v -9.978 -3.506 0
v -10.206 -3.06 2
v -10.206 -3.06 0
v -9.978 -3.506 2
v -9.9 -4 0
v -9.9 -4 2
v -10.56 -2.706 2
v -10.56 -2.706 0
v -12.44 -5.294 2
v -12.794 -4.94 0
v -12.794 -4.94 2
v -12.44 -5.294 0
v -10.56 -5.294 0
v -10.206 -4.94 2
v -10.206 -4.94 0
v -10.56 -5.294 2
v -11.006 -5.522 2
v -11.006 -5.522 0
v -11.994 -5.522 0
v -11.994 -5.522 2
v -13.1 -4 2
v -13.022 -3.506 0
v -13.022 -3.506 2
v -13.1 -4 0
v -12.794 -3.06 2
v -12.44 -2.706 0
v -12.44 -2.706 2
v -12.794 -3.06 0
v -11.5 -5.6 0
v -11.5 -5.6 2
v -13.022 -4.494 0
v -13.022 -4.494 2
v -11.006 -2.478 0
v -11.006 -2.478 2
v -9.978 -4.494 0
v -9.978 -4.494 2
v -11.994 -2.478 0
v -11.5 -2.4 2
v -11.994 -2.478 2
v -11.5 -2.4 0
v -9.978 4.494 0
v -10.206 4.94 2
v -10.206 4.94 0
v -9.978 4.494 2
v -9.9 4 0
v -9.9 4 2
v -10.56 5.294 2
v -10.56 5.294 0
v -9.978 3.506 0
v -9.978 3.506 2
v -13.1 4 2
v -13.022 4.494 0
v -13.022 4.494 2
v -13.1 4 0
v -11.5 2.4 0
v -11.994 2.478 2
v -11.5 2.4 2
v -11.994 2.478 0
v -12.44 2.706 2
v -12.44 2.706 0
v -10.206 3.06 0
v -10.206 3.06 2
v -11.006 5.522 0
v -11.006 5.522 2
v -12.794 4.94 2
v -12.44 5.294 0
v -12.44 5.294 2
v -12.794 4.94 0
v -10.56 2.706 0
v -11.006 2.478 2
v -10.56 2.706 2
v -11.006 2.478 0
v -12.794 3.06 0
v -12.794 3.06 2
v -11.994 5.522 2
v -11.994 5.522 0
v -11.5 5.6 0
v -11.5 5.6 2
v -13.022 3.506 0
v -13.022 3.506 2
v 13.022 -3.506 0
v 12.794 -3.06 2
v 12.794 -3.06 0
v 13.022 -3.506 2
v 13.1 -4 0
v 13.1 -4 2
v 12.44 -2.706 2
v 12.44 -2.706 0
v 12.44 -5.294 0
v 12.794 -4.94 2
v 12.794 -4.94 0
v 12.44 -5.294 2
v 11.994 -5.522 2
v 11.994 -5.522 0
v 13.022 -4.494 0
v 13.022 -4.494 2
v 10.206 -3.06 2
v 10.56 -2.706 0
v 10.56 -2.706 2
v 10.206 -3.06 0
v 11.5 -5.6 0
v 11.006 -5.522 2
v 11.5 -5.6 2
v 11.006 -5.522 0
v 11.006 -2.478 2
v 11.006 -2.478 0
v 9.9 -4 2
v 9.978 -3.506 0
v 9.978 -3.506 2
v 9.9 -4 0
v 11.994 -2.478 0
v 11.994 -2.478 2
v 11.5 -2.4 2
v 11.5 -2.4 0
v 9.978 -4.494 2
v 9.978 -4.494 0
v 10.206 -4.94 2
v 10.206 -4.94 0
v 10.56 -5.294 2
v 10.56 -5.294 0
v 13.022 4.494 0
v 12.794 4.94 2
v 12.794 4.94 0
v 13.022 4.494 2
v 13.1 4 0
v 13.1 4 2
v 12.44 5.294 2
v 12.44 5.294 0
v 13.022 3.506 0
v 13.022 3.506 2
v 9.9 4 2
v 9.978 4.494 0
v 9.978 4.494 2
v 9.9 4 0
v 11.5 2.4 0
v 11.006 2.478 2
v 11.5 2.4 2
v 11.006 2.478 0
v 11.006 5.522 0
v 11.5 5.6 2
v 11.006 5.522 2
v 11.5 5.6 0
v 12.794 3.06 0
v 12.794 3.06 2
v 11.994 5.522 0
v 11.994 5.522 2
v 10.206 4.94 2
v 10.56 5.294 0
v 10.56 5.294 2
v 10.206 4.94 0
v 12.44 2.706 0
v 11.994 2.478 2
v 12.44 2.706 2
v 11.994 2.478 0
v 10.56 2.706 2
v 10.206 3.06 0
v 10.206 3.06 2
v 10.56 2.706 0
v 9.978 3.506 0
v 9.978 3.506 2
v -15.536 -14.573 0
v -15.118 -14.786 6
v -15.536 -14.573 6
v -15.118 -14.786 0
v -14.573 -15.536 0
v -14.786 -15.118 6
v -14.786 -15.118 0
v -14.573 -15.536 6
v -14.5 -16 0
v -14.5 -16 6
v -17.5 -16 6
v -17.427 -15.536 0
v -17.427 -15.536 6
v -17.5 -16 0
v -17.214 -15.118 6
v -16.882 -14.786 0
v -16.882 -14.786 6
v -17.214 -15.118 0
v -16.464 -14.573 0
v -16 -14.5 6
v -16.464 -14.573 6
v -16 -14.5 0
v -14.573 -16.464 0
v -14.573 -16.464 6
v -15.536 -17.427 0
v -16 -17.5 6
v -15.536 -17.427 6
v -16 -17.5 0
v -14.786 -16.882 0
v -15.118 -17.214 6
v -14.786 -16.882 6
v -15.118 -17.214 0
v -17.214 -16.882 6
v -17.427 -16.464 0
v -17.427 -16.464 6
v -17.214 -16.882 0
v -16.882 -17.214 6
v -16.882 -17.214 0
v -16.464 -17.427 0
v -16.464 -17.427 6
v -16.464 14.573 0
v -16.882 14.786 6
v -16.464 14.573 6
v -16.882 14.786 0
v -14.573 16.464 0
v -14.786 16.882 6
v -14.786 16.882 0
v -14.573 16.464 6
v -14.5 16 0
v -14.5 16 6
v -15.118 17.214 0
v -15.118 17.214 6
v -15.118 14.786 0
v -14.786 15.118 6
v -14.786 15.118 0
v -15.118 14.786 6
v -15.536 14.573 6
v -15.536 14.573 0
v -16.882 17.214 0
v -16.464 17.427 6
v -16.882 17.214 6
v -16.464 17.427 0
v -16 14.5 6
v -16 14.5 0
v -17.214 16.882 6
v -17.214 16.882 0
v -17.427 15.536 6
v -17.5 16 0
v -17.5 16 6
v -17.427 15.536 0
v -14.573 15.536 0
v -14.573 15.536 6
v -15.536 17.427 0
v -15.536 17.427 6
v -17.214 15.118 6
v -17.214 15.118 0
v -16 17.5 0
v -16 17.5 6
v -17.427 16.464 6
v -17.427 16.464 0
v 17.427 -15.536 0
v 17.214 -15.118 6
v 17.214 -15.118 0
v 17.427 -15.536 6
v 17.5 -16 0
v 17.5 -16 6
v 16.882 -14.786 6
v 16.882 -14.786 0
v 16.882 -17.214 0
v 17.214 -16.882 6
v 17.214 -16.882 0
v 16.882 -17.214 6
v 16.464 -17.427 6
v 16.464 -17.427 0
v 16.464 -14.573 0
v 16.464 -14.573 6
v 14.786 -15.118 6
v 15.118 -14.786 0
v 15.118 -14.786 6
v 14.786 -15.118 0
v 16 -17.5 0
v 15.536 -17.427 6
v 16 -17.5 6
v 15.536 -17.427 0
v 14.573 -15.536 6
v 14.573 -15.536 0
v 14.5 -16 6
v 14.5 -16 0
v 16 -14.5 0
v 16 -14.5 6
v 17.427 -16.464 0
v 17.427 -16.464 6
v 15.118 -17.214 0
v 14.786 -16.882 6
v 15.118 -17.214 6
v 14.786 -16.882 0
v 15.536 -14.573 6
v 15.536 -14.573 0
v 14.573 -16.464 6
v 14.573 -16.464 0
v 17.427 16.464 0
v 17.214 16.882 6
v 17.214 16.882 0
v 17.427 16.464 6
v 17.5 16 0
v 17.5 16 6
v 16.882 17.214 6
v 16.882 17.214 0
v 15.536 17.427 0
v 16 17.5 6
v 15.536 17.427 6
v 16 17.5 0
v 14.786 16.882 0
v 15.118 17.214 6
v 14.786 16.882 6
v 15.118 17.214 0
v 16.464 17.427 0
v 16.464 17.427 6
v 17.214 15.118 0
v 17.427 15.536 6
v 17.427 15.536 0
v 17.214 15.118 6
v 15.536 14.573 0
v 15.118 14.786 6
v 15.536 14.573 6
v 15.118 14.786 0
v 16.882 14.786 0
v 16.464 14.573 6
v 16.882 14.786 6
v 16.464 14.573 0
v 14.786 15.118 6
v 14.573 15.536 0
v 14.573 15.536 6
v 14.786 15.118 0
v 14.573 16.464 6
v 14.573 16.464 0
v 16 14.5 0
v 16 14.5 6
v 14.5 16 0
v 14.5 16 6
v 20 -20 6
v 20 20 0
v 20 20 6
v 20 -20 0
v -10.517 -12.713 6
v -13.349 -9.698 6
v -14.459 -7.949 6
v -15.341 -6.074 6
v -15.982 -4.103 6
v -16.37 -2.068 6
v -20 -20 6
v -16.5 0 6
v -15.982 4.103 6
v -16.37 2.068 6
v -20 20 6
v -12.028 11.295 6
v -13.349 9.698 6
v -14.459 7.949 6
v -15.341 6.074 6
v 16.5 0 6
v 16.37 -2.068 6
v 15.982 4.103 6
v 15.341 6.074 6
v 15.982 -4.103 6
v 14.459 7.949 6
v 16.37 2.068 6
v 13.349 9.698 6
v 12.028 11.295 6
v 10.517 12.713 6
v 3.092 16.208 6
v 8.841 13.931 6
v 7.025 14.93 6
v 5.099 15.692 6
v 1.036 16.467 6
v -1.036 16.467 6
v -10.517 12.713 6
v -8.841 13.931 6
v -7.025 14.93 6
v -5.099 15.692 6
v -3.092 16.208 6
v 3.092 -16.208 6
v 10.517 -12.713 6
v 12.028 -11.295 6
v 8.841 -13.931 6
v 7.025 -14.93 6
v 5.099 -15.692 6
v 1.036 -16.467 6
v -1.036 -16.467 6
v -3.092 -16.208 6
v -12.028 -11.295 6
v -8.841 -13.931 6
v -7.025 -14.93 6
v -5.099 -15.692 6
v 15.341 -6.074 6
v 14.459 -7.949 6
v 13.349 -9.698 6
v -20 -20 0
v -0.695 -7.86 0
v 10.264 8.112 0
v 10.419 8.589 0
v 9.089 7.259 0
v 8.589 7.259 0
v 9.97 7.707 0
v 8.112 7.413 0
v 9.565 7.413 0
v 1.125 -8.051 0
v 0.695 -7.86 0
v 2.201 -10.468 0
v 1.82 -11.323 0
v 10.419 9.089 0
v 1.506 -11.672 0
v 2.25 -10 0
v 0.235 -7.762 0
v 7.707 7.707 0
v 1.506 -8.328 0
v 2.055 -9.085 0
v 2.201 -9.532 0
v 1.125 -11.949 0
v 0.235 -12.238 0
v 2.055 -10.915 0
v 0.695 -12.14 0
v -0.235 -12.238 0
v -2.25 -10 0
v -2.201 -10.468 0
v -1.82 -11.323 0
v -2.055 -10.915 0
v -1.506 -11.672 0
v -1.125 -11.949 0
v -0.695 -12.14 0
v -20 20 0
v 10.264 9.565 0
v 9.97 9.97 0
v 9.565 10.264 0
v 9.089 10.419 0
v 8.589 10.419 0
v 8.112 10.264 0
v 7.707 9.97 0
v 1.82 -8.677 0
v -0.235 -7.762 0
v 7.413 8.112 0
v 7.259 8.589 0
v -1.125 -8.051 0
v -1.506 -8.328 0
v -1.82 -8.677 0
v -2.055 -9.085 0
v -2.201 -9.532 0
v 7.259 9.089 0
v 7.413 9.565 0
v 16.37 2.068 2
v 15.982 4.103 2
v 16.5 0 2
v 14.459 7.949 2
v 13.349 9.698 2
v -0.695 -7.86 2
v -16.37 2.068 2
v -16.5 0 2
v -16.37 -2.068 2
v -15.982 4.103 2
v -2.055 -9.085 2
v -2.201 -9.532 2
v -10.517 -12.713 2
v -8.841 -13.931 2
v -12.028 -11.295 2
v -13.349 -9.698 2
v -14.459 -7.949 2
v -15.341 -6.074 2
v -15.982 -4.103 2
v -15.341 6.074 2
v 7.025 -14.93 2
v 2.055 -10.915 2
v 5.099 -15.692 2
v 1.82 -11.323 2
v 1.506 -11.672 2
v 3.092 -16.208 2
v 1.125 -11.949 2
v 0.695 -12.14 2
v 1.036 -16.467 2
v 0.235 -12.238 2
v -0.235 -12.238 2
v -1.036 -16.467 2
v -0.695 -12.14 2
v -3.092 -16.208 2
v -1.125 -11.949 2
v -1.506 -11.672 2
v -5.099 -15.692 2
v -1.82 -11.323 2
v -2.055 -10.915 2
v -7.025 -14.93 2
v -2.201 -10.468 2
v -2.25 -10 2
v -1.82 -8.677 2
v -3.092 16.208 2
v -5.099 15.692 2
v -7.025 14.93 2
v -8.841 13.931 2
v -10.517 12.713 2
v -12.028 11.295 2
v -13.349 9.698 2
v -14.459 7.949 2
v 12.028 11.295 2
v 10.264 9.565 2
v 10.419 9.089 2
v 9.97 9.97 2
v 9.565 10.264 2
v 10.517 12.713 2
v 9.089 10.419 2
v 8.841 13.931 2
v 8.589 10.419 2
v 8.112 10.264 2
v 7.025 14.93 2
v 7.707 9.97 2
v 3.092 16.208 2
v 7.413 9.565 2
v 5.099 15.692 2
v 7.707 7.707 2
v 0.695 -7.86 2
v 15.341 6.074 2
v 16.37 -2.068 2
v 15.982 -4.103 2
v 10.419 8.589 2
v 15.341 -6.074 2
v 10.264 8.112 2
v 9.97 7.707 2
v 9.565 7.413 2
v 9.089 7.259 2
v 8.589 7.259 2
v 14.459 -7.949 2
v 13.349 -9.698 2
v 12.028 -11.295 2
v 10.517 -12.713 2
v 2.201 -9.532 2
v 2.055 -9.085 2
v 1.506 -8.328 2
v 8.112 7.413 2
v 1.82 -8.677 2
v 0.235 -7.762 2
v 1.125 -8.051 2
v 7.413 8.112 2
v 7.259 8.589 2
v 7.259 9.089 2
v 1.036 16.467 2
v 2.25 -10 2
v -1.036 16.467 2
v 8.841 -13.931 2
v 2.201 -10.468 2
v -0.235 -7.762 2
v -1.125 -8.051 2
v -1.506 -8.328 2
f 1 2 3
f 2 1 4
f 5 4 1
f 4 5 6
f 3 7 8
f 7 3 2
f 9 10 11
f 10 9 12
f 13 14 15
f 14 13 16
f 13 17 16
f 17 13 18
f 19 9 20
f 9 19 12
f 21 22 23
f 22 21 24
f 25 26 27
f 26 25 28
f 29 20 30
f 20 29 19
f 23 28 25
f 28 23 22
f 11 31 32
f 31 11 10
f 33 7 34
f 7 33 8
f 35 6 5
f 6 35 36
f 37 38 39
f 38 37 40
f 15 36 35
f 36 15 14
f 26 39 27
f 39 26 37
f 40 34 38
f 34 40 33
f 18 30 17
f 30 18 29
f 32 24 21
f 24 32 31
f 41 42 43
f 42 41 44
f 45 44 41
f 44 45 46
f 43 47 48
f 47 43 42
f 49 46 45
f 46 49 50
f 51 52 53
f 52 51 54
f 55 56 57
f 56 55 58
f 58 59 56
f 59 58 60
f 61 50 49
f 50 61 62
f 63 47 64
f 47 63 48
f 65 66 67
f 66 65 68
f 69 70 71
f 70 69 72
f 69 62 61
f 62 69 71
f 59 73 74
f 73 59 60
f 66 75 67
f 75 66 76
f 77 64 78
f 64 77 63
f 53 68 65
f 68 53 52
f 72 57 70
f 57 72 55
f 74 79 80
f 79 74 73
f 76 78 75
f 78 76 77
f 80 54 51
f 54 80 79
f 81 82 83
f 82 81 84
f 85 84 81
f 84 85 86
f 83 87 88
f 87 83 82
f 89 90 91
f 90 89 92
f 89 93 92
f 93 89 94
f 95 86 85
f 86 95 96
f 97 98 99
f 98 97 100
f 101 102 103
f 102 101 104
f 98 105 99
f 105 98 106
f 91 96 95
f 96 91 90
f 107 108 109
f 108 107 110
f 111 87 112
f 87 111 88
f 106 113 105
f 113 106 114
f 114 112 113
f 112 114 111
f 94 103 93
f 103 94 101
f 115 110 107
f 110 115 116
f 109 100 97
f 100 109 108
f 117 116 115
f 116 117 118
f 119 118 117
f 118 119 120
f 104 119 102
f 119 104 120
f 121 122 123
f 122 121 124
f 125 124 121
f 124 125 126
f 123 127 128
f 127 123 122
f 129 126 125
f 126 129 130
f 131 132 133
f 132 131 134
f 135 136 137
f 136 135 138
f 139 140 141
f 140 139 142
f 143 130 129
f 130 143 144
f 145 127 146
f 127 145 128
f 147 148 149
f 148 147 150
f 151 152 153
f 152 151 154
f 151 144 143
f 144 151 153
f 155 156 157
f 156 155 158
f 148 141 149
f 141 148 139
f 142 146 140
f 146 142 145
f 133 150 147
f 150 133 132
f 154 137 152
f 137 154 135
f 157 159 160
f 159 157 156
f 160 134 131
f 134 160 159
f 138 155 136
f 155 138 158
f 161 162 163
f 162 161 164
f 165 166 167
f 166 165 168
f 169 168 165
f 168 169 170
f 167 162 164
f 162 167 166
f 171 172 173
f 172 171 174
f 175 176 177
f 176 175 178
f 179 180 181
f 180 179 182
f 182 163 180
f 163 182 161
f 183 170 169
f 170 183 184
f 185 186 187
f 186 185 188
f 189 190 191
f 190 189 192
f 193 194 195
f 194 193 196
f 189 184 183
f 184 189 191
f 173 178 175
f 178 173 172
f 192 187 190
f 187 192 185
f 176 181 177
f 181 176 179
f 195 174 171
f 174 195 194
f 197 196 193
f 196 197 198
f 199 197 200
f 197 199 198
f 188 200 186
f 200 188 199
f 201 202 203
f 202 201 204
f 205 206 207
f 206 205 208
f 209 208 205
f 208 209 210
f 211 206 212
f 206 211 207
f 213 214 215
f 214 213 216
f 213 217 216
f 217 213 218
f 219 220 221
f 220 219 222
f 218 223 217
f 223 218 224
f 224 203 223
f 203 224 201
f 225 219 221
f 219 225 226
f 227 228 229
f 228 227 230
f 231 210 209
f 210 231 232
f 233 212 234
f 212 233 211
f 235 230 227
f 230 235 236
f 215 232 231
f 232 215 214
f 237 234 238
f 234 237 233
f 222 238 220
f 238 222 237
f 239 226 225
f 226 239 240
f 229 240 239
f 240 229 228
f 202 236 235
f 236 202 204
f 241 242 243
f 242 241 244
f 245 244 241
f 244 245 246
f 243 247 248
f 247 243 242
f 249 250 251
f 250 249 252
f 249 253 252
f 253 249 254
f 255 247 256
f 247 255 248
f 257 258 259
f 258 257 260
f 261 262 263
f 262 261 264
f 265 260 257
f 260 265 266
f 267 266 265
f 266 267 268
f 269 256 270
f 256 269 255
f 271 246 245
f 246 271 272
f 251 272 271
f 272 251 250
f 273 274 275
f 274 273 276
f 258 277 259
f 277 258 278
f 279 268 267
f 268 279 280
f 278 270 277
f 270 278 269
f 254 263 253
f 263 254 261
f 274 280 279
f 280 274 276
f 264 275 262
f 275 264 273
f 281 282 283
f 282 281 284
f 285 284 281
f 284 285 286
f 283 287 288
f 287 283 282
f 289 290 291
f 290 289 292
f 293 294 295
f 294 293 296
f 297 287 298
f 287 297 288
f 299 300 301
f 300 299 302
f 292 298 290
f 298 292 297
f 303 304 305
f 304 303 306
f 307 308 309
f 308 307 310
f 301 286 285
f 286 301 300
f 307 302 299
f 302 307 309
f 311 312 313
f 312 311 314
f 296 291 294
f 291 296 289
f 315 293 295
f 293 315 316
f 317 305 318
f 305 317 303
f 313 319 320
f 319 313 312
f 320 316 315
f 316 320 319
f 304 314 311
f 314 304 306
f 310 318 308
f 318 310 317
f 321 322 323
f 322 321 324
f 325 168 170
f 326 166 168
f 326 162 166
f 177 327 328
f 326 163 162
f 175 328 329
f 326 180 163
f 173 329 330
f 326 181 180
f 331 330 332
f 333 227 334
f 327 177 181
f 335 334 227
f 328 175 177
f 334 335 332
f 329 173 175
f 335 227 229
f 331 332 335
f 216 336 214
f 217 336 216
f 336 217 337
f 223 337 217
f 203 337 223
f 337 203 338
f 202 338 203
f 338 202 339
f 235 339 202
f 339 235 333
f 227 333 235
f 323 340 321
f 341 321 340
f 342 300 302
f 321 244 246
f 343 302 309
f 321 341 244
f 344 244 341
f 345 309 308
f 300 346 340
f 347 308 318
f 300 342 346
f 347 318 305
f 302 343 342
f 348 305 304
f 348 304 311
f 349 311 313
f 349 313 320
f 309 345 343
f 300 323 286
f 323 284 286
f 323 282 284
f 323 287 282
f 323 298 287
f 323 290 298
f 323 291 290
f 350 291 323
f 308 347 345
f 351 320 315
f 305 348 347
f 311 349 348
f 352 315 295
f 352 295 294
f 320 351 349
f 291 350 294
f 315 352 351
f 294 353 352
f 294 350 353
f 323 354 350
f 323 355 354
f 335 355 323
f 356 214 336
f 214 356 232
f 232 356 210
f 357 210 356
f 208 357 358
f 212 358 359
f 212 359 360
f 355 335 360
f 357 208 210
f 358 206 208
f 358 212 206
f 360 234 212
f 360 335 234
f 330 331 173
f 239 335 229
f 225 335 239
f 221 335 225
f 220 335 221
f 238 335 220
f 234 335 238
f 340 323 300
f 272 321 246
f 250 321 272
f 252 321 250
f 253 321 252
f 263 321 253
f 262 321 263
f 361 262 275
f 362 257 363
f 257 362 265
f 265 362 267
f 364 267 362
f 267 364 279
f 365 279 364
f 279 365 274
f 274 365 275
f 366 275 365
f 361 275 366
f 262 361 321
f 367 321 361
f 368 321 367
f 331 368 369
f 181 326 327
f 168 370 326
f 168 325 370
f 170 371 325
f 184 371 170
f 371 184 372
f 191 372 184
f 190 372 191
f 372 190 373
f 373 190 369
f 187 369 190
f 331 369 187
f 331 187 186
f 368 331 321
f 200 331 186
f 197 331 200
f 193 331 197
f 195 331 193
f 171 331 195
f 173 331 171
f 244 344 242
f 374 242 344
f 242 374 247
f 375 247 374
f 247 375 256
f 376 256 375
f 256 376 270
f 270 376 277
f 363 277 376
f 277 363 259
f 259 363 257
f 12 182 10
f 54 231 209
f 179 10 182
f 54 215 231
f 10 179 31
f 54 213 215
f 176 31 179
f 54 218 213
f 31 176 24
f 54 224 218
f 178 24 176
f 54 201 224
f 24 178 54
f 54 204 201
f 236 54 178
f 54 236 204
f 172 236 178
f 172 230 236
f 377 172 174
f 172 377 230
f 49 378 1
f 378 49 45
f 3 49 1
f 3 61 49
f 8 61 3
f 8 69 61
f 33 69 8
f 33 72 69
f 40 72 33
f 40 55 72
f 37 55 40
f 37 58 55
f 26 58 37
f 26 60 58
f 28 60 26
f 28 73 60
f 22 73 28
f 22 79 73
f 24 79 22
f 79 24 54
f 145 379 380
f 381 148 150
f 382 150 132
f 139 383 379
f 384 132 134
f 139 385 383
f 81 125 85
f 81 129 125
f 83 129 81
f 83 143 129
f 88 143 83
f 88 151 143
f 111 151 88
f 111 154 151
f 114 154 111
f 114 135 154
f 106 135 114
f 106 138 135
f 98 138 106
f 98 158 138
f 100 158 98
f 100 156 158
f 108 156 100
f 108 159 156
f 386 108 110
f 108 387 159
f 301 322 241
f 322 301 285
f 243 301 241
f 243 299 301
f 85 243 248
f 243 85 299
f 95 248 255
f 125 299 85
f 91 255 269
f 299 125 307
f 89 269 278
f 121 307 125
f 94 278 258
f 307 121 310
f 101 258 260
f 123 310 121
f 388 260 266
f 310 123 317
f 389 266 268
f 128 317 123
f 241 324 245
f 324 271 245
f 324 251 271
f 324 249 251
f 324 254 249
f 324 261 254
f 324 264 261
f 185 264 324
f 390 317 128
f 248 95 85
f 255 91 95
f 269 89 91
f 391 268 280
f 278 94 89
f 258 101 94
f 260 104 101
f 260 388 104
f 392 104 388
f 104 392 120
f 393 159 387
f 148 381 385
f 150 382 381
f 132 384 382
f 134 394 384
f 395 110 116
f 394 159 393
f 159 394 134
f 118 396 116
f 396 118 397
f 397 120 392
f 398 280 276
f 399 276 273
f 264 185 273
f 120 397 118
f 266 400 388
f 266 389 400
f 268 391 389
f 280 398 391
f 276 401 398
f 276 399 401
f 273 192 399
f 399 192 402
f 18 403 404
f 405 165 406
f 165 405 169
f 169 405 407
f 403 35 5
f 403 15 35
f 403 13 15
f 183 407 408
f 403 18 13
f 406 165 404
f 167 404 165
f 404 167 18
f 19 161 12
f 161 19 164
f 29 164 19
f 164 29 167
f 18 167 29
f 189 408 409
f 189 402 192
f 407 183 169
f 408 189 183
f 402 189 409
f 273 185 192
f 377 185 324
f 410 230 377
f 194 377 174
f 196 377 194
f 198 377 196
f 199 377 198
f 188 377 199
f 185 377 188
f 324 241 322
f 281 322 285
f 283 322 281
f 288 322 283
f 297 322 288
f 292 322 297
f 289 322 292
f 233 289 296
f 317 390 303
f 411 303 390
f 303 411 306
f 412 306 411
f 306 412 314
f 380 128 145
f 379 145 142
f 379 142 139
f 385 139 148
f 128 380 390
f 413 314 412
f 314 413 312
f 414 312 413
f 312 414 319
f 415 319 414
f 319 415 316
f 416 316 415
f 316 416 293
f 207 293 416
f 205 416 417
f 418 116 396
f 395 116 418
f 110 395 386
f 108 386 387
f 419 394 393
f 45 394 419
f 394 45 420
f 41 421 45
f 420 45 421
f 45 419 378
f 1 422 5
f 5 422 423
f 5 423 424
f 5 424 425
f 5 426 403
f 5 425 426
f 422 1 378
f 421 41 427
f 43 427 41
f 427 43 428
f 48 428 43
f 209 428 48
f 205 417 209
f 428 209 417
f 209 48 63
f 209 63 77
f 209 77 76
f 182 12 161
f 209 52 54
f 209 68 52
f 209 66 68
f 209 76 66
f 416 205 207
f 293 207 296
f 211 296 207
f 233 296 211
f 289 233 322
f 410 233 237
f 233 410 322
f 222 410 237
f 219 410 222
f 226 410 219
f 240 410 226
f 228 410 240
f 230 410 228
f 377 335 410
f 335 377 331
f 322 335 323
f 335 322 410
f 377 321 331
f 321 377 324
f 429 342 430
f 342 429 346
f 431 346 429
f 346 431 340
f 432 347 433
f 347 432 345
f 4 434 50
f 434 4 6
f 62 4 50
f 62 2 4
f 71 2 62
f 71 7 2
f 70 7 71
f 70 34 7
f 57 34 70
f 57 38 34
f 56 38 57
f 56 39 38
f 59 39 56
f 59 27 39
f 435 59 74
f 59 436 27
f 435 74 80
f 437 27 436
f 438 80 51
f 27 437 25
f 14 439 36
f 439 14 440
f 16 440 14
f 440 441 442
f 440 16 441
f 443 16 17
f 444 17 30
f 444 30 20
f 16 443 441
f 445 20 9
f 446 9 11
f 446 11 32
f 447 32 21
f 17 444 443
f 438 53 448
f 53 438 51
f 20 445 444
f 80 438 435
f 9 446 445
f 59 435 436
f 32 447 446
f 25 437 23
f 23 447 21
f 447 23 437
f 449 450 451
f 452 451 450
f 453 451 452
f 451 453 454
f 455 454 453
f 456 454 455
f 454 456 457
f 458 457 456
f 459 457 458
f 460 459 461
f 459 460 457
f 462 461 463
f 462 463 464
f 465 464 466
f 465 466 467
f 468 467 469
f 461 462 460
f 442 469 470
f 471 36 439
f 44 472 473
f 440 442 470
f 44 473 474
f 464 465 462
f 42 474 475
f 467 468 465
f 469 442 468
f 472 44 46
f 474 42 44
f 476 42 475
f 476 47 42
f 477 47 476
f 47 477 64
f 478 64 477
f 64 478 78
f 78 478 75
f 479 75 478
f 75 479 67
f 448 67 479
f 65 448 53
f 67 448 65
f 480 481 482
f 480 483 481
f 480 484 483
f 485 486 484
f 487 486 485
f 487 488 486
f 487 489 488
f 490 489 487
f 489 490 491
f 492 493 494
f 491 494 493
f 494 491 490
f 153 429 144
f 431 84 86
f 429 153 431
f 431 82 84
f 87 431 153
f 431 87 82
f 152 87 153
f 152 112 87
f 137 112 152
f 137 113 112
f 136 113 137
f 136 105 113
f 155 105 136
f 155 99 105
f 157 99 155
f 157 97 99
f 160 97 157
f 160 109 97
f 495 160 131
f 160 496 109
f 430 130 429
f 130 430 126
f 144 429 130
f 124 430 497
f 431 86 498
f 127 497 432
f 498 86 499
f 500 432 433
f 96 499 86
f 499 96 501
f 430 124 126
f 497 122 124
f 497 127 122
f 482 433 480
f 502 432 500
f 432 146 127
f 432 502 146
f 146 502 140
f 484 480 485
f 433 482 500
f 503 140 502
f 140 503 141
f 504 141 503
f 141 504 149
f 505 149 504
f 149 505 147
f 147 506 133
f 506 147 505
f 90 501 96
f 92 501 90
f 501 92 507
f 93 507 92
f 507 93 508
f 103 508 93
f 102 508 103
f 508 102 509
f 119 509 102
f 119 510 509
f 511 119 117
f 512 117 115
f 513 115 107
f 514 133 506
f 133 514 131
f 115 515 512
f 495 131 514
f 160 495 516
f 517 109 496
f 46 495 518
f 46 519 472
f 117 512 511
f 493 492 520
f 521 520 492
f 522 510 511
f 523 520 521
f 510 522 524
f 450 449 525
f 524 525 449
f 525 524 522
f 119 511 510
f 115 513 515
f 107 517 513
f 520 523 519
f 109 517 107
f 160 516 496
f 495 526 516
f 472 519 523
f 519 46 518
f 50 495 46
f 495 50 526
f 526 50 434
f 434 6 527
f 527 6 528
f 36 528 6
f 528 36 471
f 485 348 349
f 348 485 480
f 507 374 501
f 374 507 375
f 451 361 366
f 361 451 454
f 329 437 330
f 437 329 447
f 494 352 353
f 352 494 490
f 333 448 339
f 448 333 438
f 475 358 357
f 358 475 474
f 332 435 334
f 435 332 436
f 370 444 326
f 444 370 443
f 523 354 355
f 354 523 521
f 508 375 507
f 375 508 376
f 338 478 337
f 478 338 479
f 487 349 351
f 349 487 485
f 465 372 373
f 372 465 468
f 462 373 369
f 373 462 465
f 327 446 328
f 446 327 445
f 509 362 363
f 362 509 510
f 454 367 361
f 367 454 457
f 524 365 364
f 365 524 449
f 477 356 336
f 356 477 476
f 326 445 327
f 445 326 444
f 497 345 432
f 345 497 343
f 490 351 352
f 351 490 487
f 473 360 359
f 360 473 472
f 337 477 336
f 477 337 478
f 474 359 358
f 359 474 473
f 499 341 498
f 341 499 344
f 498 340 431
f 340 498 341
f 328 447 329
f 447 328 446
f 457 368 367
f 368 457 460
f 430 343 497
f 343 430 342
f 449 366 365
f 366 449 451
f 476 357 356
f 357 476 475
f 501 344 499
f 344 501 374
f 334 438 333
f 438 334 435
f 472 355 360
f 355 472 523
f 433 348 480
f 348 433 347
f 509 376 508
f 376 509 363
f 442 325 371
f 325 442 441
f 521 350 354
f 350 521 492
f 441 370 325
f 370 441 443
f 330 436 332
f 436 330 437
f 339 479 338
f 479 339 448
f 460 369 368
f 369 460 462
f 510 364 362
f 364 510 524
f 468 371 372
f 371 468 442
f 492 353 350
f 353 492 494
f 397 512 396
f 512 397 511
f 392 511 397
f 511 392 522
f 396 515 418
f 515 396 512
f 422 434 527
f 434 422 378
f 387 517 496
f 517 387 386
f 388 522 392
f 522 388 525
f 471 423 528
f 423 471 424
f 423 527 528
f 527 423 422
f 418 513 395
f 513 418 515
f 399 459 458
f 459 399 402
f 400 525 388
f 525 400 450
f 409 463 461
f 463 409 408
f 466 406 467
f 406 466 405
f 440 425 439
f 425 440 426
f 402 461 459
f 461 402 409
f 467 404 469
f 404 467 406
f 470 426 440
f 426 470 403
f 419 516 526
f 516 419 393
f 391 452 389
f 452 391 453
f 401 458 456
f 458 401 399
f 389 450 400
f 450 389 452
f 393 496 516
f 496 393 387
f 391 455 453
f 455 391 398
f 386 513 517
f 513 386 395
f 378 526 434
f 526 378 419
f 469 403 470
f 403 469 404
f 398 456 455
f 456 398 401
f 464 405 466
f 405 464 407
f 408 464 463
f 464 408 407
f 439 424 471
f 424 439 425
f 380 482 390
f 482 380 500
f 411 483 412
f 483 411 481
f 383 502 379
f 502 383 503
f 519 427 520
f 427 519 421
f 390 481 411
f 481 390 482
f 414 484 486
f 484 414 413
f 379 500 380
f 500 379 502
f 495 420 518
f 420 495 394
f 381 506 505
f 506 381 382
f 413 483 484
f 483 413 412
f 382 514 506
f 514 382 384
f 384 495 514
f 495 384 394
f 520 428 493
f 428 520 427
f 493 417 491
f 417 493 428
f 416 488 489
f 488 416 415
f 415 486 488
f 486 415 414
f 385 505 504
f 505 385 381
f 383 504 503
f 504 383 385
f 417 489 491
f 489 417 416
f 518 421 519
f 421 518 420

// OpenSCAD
base();

module base() {
  intersection(){
    *translate([-20,-20,4]) cube([40,40,2]);
    difference() {
      translate([-20,-20]) cube([40,40,6]);
      translate([0,0,2]) cylinder(d=33,h=6,$fn=50);
      translate([0,-10,-.01]) cylinder(d=4.5,h=6.02,$fn=30);
      rotate([0,0,-45]) translate([0,12.5,-.01]) cylinder(d=3.2,h=6.02,$fn=20);
      for(x=[-11.5,11.5],y=[-4,4])
        translate([x,y,-.01]) cylinder(d=3.2,h=6.02,$fn=20);
      for(x=[-16,16],y=[-16,16])
        translate([x,y,-.01]) cylinder(d=3,h=6.02,$fn=20);
    }
  }
}
module needle() {
difference(){
  union(){
    linear_extrude(3) {
      polygon([[-2,0],[-.5,20],[.5,20],[2,0]]);
      translate([0,20]) circle(d=1,$fn=20);
    }
    cylinder(d=6,h=5,$fn=30);
    cylinder(d1=6,d2=8,h=3,$fn=30);
  }
  translate([0,0,1]) cylinder(d=1.5,h=5,$fn=10);
}
}
